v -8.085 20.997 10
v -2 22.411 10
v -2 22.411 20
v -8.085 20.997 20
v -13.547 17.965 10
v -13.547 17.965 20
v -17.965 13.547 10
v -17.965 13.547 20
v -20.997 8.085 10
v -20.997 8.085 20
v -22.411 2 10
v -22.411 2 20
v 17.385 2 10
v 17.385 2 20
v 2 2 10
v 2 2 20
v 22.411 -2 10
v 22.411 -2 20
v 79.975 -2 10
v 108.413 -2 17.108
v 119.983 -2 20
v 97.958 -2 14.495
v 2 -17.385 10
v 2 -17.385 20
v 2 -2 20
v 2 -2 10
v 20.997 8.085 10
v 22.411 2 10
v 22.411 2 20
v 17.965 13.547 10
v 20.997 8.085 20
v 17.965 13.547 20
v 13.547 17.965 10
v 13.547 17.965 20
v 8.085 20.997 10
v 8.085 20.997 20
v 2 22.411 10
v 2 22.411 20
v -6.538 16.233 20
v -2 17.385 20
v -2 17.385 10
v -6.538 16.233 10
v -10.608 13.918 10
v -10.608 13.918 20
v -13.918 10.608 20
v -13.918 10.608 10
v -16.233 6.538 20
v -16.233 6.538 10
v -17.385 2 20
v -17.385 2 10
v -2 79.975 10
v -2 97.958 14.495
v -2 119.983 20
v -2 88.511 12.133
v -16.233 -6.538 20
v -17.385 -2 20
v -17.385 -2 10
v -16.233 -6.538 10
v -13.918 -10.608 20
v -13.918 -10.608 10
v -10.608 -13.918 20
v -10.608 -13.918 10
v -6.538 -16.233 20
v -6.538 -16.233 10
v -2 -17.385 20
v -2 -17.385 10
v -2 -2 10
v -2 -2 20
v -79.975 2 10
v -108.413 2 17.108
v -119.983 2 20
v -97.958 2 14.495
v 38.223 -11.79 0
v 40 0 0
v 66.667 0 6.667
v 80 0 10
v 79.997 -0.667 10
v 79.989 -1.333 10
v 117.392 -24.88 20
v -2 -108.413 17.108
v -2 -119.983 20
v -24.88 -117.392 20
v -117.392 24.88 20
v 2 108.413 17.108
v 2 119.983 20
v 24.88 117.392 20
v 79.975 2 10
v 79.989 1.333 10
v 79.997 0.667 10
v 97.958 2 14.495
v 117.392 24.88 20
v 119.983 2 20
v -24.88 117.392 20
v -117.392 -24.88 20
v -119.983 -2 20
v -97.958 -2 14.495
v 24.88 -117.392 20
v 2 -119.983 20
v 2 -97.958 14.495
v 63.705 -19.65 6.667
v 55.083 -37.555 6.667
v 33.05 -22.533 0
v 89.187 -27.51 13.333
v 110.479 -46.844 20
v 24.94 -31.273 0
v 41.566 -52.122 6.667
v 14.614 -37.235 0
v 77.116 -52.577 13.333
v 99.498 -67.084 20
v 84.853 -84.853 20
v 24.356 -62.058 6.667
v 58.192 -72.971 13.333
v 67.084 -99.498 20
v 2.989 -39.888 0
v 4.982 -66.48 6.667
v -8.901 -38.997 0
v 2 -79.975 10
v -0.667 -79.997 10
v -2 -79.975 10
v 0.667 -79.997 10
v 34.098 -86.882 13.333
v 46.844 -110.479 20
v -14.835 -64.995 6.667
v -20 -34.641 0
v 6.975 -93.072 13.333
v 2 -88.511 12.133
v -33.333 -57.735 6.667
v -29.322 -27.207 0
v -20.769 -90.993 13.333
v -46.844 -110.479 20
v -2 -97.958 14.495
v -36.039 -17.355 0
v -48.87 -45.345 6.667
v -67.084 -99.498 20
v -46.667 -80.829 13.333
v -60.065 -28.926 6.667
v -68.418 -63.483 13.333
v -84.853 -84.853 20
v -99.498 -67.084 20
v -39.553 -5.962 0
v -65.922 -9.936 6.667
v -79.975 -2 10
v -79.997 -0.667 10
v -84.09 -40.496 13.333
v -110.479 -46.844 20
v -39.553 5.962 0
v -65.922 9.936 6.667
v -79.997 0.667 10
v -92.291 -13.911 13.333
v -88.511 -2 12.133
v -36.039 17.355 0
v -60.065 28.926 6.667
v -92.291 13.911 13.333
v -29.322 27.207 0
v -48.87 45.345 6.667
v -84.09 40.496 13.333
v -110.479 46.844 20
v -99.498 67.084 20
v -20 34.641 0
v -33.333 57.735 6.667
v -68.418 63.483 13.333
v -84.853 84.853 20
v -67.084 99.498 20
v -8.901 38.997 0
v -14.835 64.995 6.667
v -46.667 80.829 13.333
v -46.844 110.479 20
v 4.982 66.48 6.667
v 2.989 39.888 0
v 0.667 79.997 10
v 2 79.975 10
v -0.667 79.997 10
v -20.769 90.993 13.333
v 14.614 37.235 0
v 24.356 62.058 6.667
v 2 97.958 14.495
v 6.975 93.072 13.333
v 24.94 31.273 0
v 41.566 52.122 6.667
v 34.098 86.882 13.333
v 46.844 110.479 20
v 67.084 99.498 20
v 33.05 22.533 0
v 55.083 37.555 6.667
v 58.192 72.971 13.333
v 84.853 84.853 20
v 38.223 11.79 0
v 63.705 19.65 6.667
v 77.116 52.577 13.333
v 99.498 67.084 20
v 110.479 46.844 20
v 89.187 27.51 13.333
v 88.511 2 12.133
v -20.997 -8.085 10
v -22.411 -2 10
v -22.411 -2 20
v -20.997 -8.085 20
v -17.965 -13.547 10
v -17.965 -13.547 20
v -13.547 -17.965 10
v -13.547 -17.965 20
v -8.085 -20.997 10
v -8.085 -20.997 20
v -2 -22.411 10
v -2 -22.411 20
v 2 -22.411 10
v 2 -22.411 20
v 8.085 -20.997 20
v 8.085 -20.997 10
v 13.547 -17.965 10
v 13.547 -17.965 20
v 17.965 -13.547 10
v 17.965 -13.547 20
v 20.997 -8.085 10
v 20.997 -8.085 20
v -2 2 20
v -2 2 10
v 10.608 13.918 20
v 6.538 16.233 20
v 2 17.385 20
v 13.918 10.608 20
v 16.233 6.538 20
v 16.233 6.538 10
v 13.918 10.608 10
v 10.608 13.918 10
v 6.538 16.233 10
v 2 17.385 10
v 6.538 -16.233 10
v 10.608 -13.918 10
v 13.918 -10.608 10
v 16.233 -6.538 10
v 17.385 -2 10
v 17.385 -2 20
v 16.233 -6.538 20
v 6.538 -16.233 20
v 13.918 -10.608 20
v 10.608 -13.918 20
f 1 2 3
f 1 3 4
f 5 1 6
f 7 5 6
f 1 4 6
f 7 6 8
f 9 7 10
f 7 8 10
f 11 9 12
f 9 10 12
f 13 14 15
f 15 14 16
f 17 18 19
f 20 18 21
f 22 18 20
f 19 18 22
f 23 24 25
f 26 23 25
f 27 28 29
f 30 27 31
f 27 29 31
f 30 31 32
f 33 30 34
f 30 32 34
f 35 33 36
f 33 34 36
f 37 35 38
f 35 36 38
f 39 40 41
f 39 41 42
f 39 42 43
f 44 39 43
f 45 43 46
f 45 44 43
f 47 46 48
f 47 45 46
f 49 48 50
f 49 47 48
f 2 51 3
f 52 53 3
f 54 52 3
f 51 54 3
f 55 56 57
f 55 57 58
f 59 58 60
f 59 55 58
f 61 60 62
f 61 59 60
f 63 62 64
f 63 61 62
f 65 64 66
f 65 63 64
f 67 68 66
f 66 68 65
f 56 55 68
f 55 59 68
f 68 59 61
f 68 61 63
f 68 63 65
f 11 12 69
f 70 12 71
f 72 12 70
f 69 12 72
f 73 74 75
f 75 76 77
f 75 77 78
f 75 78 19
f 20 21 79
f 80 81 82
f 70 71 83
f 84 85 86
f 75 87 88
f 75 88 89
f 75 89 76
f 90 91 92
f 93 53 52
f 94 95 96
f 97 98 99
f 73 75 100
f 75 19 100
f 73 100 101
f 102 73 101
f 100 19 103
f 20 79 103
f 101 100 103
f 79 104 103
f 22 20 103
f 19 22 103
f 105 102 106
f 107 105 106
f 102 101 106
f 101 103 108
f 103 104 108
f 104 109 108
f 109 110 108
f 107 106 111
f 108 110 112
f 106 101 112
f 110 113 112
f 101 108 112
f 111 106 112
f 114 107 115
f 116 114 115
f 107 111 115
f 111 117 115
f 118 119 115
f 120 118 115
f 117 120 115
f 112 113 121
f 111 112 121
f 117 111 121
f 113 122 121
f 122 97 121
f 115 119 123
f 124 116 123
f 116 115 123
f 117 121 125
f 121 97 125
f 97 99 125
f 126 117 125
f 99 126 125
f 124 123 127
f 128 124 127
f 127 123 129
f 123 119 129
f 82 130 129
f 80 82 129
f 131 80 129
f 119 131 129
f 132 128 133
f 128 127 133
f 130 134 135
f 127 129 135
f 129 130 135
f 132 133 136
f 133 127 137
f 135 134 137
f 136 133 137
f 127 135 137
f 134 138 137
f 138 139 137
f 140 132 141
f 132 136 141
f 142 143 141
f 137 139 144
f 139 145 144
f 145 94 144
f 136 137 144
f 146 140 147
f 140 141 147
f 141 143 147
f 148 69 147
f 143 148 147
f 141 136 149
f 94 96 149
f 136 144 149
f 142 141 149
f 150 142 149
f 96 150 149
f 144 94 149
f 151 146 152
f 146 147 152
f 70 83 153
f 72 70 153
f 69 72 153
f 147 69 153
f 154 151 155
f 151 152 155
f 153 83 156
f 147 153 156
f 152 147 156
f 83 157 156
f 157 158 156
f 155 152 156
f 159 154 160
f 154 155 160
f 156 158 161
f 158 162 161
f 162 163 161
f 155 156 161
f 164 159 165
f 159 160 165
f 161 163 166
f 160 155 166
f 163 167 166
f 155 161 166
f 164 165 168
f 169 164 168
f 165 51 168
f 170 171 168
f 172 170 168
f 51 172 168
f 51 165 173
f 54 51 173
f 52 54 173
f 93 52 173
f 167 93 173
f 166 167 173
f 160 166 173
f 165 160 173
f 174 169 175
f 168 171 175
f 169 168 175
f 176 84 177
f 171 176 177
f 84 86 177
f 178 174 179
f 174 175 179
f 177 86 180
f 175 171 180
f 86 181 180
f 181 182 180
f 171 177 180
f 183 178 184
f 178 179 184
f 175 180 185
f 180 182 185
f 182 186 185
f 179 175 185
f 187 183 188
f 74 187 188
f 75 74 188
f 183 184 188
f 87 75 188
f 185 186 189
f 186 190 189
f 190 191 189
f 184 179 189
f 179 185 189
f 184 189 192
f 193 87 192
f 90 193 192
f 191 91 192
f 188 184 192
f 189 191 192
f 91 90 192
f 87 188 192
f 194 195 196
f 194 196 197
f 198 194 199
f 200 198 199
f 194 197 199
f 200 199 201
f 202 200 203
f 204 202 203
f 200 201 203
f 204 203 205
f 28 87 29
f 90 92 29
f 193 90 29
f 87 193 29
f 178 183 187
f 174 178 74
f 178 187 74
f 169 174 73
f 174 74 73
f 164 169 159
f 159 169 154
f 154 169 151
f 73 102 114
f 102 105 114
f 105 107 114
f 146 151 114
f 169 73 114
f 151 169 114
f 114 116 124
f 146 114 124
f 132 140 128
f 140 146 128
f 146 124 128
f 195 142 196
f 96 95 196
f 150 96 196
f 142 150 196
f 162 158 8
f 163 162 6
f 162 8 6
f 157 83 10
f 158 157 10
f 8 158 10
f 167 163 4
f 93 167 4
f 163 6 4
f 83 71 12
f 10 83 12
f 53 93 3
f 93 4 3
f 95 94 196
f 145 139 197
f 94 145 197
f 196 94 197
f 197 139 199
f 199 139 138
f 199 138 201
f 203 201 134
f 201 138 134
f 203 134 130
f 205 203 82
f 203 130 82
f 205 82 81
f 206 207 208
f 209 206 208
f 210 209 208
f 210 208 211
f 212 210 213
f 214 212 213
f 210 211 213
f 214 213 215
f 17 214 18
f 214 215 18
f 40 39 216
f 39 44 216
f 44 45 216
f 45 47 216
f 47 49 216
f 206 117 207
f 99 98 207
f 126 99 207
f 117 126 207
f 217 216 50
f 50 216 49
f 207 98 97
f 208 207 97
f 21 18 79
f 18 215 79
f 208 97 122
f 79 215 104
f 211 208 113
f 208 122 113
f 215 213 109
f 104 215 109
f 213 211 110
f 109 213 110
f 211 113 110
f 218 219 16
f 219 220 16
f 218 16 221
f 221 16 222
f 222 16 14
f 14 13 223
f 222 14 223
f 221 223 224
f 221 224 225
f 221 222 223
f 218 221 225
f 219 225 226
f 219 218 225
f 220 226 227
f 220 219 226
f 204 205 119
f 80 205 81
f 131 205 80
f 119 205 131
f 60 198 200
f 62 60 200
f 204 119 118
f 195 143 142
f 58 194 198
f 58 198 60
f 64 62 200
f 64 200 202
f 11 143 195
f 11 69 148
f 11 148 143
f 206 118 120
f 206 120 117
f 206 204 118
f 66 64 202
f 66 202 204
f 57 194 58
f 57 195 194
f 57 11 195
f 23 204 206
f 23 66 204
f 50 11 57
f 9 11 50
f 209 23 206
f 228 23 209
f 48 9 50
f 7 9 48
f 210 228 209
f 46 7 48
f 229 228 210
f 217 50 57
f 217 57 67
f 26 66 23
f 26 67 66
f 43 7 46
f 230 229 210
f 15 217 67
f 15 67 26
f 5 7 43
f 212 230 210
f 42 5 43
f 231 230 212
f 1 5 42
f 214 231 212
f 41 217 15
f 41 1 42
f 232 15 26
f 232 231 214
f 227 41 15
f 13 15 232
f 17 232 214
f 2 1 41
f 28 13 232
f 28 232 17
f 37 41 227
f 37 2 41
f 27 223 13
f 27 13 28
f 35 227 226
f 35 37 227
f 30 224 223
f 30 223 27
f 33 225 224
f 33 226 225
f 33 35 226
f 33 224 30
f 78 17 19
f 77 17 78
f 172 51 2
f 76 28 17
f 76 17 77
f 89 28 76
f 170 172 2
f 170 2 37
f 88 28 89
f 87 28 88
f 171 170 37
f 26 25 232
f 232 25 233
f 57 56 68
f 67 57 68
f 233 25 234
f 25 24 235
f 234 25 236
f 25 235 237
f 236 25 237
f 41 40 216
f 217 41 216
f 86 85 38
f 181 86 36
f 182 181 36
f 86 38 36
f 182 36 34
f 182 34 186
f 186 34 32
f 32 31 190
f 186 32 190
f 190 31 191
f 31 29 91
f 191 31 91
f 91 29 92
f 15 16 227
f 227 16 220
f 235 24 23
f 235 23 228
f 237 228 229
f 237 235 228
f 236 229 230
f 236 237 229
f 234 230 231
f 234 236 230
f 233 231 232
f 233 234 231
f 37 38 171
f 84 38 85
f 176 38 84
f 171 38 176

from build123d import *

# Parameters (mm, degrees)
F2_R     = 22.5
F2_R_2   = 17.5
F3_DEPTH = 10
F4_W     = 4
F4_H     = 4
F5_DEPTH = 10


with BuildPart() as f1:
    # F0 (on Front) → F1 (revolve)
    with BuildSketch(Plane.XZ):
        Polygon((0, 20), (0, 0), (40, 0), (120, 20), align=None)
    revolve(axis=Axis((0, 0, 10), (0, 0, -1)))

    # F2 (on face) → F3 (cut)
    with BuildSketch(Plane.XY.offset(20)):
        Circle(F2_R)
        Circle(F2_R_2, mode=Mode.SUBTRACT)
    extrude(amount=-F3_DEPTH, mode=Mode.SUBTRACT)

    # F4 (on face) → F5 (cut)
    with BuildSketch(Plane.XY.offset(20)):
        with BuildLine():
            Line((2, 2), (2, 119.9833321758))
            ThreePointArc((2, 119.9833321758), (0, 120), (-2, 119.9833321758))
            Line((-2, 119.9833321758), (-2, 2))
            Line((-2, 2), (2, 2))
        make_face()
        with BuildLine():
            Line((119.9833321758, 2), (2, 2))
            Line((2, 2), (2, -2))
            Line((2, -2), (119.9833321758, -2))
            ThreePointArc((119.9833321758, -2), (120, 0), (119.9833321758, 2))
        make_face()
        Rectangle(F4_W, F4_H)
        with BuildLine():
            Line((2, -119.9833321758), (2, -2))
            Line((2, -2), (-2, -2))
            Line((-2, -2), (-2, -119.9833321758))
            ThreePointArc((-2, -119.9833321758), (0, -120), (2, -119.9833321758))
        make_face()
        with BuildLine():
            Line((-2, -2), (-2, 2))
            Line((-2, 2), (-119.9833321758, 2))
            ThreePointArc((-119.9833321758, 2), (-120, 0), (-119.9833321758, -2))
            Line((-119.9833321758, -2), (-2, -2))
        make_face()
    extrude(amount=-F5_DEPTH, mode=Mode.SUBTRACT)


solid = f1.part
